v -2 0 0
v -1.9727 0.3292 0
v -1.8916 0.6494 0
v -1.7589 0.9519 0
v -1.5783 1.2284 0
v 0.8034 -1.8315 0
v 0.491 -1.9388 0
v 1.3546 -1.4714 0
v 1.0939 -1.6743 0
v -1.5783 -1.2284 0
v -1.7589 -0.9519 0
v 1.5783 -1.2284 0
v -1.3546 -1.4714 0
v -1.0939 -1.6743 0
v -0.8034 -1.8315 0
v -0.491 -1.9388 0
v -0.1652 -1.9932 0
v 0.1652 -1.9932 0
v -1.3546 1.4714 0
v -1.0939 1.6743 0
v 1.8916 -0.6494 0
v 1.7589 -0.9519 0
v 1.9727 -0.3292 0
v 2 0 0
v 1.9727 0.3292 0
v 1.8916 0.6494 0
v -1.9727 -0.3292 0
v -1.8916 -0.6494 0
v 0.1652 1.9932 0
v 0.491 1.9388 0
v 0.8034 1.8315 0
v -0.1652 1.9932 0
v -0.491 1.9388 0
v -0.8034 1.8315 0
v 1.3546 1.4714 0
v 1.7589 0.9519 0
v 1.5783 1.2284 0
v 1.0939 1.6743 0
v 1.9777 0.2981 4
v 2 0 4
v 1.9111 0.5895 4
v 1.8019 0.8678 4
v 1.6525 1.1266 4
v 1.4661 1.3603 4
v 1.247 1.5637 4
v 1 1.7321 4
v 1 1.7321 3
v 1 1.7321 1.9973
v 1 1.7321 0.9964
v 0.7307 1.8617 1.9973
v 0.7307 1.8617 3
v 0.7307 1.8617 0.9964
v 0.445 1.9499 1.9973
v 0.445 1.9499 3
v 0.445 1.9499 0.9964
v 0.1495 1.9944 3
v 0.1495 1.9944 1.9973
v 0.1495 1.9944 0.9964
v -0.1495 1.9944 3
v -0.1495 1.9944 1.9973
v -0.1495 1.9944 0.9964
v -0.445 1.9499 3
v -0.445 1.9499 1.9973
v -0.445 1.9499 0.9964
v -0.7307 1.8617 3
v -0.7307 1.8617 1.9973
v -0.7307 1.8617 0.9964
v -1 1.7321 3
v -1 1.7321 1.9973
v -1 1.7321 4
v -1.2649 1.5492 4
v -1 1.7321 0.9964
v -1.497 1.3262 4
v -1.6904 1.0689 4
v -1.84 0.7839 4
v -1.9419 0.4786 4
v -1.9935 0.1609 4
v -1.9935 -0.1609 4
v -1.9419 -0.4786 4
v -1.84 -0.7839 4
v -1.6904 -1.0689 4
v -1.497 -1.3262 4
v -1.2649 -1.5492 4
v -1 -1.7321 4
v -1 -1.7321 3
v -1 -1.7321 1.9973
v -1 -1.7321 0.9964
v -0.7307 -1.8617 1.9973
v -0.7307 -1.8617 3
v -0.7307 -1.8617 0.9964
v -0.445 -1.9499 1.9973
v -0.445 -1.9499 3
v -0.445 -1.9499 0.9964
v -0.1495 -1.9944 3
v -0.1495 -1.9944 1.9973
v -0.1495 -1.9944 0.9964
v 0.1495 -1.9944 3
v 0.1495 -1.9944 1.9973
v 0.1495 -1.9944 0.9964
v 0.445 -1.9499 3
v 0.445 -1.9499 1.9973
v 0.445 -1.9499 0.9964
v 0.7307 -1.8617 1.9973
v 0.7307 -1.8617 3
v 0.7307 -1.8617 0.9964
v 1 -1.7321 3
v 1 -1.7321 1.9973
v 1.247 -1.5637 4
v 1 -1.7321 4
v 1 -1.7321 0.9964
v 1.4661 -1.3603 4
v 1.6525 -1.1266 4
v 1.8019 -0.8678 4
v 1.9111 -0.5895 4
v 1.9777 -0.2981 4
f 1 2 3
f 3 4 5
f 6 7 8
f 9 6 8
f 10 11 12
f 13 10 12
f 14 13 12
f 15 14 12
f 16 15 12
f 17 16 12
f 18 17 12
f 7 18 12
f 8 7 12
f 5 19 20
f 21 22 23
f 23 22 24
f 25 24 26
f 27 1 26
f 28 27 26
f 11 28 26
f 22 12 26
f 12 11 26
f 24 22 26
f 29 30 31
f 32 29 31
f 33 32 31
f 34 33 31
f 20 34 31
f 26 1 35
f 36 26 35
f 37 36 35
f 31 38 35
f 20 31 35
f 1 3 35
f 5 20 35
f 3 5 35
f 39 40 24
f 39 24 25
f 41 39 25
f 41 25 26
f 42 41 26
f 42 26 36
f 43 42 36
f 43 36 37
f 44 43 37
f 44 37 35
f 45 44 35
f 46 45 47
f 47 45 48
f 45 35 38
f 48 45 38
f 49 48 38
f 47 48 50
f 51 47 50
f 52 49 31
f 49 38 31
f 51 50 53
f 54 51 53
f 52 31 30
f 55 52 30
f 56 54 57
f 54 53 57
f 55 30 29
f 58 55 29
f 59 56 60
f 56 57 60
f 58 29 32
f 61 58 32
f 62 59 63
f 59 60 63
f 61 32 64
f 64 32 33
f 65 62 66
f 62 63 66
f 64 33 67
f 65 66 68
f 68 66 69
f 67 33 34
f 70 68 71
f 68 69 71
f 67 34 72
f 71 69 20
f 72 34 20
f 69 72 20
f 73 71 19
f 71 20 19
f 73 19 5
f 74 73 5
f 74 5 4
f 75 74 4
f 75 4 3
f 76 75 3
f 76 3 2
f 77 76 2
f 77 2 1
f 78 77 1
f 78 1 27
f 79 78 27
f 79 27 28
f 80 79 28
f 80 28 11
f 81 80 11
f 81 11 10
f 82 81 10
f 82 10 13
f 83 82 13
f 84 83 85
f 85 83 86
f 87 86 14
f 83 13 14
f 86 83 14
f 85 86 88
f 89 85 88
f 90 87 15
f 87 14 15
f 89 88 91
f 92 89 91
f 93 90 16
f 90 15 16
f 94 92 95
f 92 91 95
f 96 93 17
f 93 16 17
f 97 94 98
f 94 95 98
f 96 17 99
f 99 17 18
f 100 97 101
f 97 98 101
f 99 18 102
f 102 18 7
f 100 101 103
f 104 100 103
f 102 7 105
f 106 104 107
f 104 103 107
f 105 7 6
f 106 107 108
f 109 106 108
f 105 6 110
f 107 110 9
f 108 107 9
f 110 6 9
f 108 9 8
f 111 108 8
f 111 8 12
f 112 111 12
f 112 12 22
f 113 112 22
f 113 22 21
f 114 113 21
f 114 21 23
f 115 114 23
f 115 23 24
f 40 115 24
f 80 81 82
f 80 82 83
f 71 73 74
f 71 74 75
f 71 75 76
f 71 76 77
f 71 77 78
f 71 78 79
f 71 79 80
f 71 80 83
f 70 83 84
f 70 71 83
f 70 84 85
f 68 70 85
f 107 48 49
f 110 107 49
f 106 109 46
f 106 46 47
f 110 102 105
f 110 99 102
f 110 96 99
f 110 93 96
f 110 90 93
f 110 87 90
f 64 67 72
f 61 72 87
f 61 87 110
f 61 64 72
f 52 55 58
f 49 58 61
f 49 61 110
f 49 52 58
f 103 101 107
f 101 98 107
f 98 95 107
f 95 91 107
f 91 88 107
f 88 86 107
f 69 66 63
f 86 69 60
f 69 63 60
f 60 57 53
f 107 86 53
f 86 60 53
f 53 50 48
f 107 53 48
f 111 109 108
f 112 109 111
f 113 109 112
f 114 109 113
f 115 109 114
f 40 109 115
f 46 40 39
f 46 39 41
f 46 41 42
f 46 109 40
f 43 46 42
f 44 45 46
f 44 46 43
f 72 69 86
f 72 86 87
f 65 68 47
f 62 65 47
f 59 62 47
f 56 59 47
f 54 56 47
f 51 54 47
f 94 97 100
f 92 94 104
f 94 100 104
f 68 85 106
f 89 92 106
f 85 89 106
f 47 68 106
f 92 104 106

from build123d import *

# Parameters (mm, degrees)
SKETCH1_R           = 2
BOSS_EXTRUDE1_DEPTH = 4
SKETCH2_W           = 2
SKETCH2_H           = 1
SKETCH2_H_2         = 1.000882883
CUT_EXTRUDE1_DEPTH  = 5


with BuildPart() as part:
    # Sketch1 → Boss-Extrude1 (new body)
    with BuildSketch(Plane.XY):
        Circle(SKETCH1_R)
    extrude(amount=BOSS_EXTRUDE1_DEPTH)

    # Sketch2 → Cut-Extrude1 (cut, symmetric)
    with BuildSketch(Plane(origin=(0, 0, 0), x_dir=(1, 0, 0), z_dir=(0, 1, 0))):
        with Locations((0, -3.5)):
            Rectangle(SKETCH2_W, SKETCH2_H)
        with Locations((0, -1.496868109)):
            Rectangle(SKETCH2_W, SKETCH2_H_2)
    extrude(amount=CUT_EXTRUDE1_DEPTH, both=True, mode=Mode.SUBTRACT)


solid = part.part
